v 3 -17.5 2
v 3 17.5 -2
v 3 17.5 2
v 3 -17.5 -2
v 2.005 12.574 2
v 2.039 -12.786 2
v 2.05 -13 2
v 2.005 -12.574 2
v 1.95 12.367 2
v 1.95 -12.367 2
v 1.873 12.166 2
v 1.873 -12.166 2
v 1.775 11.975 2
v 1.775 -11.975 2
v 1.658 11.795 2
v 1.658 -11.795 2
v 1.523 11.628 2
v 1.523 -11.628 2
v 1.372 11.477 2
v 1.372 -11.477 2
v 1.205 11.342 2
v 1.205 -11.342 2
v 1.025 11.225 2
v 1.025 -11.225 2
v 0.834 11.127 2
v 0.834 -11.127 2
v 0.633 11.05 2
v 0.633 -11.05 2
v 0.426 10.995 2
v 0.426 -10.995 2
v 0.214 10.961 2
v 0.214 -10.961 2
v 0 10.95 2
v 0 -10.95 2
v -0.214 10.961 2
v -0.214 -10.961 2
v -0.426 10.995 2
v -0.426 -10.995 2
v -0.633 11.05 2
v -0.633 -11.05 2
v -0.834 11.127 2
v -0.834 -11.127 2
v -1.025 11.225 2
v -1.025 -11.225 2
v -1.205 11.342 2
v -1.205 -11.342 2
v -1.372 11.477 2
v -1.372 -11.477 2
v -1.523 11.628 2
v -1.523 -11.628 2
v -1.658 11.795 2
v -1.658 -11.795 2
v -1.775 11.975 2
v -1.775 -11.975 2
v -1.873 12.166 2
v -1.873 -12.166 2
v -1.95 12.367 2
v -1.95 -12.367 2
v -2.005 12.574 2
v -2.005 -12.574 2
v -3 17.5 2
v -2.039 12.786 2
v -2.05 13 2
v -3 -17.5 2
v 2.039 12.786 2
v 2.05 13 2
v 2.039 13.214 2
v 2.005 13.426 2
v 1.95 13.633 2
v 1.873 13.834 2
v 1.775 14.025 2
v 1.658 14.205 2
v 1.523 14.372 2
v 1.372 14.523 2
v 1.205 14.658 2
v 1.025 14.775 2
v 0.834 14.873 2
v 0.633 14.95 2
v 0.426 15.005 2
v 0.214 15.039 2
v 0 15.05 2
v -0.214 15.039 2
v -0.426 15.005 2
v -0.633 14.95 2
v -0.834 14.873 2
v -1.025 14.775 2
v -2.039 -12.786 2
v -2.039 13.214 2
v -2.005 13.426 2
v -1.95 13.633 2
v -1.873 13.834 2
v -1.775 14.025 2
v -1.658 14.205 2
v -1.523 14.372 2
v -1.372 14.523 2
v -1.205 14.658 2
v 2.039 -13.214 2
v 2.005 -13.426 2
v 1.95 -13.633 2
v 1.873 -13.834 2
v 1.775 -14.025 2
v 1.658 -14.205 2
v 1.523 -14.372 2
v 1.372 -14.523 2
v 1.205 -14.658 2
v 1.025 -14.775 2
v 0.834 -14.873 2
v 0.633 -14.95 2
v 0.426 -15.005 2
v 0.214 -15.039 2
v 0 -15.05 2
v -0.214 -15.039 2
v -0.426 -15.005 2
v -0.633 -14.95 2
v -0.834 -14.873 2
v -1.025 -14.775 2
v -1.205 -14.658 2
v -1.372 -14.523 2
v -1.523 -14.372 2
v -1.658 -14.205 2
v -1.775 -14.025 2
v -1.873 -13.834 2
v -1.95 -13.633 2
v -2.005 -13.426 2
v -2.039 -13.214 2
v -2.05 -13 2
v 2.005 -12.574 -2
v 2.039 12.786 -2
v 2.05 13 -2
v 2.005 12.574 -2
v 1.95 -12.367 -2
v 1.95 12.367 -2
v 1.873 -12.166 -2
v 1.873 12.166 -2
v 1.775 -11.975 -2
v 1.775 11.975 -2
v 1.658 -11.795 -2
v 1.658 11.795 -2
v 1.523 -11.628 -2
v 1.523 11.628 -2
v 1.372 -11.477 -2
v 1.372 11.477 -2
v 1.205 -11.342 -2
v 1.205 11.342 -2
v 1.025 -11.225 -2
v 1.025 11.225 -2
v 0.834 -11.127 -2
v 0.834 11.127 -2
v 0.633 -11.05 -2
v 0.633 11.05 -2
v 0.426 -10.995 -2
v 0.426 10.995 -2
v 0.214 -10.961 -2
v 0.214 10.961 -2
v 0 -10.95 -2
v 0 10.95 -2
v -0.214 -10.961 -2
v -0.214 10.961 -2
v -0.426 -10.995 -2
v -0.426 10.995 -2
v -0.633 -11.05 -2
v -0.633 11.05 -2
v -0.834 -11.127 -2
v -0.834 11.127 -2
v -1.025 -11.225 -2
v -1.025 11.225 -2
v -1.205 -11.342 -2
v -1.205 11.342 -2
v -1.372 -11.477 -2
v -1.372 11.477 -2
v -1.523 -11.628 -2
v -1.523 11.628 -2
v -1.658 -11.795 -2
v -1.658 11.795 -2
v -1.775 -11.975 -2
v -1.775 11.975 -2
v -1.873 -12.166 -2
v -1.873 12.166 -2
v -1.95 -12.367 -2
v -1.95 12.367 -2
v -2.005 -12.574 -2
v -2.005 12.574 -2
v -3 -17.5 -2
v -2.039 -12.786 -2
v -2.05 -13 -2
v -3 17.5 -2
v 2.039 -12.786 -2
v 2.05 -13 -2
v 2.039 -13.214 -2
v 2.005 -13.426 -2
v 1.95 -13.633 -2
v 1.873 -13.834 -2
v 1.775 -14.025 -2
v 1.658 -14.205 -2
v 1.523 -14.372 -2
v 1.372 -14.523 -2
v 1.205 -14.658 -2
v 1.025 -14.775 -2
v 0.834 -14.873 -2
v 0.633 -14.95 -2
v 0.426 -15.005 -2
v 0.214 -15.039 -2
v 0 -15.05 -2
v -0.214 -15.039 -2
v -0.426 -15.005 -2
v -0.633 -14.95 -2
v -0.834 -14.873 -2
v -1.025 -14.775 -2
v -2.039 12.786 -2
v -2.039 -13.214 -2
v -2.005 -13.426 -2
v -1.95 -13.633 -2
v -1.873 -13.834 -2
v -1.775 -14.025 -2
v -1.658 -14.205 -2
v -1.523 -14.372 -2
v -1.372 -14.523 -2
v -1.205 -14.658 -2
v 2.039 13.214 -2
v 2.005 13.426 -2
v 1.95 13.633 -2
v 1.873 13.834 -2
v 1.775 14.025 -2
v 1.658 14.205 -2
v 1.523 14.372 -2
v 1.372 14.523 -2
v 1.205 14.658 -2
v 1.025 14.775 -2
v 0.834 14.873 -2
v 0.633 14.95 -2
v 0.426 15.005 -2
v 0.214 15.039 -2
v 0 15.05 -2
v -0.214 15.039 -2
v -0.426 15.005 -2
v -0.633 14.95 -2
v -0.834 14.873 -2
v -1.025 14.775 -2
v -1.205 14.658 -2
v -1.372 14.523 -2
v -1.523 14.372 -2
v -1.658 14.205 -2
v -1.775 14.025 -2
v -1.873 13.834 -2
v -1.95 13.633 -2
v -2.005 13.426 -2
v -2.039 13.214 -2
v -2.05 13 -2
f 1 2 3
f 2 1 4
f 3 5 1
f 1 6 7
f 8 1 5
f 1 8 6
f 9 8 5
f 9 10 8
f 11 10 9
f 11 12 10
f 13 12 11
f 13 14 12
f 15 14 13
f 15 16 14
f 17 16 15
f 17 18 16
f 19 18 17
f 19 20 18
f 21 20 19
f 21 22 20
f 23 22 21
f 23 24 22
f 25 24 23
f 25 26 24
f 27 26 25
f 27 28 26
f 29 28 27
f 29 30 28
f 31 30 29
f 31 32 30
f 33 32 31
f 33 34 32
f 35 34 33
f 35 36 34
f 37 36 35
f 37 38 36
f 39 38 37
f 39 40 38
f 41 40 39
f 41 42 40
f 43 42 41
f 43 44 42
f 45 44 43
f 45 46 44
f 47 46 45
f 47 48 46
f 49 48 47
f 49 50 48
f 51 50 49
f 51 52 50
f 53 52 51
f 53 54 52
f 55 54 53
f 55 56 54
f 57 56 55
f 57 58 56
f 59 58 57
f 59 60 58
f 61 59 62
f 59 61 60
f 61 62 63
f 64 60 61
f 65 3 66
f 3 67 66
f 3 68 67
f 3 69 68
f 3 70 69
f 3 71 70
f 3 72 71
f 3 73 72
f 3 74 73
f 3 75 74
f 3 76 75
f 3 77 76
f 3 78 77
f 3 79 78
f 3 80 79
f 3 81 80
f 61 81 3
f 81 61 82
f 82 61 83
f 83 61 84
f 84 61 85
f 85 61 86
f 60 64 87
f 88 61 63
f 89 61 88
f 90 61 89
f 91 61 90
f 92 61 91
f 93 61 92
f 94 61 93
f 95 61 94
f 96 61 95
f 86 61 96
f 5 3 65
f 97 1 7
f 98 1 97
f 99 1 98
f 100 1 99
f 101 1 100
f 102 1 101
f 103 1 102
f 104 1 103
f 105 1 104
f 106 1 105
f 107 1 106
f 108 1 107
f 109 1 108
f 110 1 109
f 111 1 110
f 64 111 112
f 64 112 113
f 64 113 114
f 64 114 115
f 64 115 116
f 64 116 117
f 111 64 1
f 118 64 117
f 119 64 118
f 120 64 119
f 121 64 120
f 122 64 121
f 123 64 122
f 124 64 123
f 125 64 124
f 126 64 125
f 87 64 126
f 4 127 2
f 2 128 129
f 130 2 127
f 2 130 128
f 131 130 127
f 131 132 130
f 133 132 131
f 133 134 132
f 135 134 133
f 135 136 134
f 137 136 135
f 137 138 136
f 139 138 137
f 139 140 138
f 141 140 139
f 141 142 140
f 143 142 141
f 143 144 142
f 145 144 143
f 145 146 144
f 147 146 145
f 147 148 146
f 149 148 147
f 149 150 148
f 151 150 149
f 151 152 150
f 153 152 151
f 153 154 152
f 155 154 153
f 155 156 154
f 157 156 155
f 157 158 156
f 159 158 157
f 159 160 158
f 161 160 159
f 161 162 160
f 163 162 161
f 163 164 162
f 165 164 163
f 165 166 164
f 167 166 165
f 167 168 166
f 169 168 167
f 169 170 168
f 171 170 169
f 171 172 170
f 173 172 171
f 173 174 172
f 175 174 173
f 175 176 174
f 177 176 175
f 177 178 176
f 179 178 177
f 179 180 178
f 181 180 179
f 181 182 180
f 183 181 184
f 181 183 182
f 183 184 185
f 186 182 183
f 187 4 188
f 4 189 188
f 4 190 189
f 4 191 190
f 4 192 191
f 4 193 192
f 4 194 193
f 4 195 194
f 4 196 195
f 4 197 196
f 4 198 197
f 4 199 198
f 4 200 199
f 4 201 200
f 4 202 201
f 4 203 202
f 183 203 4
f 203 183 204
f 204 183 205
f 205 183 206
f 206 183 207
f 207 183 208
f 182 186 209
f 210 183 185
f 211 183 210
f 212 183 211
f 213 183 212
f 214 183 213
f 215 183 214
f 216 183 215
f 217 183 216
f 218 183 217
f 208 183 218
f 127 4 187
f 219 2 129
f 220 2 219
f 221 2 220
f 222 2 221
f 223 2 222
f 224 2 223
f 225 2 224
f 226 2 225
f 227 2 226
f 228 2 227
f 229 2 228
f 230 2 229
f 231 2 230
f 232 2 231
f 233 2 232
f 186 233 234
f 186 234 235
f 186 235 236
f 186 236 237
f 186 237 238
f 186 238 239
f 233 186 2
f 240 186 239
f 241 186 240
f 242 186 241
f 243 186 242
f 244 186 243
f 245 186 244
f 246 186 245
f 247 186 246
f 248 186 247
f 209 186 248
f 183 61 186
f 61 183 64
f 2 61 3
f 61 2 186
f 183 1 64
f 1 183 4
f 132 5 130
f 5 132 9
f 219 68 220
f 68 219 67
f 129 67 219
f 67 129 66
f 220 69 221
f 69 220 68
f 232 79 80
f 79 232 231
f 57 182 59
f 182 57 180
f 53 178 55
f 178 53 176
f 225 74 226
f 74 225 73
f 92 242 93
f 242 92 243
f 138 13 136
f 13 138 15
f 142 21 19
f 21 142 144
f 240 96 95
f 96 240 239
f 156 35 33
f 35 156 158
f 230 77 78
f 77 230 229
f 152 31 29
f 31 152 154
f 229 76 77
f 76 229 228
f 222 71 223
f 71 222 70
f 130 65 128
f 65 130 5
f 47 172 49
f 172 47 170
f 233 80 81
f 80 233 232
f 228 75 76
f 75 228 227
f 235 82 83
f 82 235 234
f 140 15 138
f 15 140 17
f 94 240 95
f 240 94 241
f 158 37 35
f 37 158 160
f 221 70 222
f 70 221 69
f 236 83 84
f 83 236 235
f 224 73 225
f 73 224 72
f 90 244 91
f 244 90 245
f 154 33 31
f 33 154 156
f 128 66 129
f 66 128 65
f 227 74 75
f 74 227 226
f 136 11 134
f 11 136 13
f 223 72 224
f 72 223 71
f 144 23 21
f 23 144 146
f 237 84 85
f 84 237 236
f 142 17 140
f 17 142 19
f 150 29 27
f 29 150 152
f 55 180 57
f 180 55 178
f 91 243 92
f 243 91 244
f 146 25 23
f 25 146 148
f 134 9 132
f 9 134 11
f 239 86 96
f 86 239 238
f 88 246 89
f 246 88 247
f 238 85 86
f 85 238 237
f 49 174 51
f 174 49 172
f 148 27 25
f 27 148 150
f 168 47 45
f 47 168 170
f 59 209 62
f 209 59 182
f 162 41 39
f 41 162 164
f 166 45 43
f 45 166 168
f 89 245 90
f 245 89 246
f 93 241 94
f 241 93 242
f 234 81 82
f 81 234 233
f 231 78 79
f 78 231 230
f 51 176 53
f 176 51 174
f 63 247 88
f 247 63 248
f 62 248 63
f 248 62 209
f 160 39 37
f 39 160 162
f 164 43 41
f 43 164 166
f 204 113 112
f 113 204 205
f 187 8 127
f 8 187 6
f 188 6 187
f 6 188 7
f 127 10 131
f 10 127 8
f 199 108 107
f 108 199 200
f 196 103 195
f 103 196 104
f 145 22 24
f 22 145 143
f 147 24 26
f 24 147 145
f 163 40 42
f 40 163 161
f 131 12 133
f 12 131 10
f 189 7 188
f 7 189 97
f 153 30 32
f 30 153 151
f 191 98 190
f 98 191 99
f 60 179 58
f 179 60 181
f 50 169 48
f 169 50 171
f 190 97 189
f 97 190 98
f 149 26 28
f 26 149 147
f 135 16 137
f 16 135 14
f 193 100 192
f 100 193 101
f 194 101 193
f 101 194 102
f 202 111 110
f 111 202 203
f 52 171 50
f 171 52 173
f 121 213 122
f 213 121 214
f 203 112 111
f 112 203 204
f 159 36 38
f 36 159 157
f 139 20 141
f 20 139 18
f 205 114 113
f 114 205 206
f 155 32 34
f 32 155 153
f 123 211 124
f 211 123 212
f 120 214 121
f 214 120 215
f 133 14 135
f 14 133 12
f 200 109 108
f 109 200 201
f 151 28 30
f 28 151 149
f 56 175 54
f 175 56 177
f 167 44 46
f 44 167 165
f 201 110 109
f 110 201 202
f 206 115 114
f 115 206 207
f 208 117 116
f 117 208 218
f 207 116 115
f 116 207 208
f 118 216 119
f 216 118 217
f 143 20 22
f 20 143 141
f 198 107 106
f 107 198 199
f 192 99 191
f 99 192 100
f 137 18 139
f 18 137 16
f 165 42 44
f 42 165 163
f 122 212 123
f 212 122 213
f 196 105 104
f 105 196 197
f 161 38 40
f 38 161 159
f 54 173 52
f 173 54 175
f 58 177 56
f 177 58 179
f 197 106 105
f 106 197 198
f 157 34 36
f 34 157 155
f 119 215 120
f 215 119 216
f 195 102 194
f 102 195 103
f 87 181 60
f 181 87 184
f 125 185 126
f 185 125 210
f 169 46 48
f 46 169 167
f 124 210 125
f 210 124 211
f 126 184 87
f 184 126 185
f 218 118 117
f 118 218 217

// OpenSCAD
// file: constants.scad
    /*Project constants*/
//width = ScrewHoleDist+(BaseDiam*2)+ WidthCompl
//
//Distance of the holes for mounting, affects the width(y-axis)
ScrewHoleDist = 31;

//Thickness of the plate
BaseThick = 8.0;

 
//Diameter of the hole in the middle on the stepper holder
MidHoleDiam = 23;

//Diameter of the screw hole
ScrewHoleDiam = 3.1;
    
//Diameter of the corner cylinders,affects the width of the body(y-axis)
BaseDiam = 3;

//Body width complement (y-axis)
WidthCompl = 10;
//Body length complement (x-axis)
LengthCompl = 10;

//Body length complement for the upper part (x-axis)
LengthDiffUp = 5;

//Body length complement for the moving part (x)
LengthDiffDown = 5;

W = ScrewHoleDist+(BaseDiam*2)+WidthCompl;
L = ScrewHoleDist+(BaseDiam*2)+LengthCompl;



//Diameter of the smooth rods
RodDiam = 5;

SmoothRodDistFromCenter = 16.5; // 31/2;

//diameter of the bearing
BearingDiam = RodDiam+6;

BearingHeight = 20 + 2;

//Diameter of the threaded rod  
ThreadedRodDiam = 10.3;

//Diameter of the hole for the threaded rod
ThreadedRodHoleDiam = 10.8;

NutDiam = 22.0;
NutHeight =20;
NutWall=2;
NutHoleDiam = NutDiam-2*NutWall;


//size and height of the linear motion nut
ThreadedNutSize = 10.25;
ThreadedNutHeight = 4.95;

//size and height of the syringe tightening nut
SyrNutSize = 5.6; //5.41
SyrNutHeight = 2.4; //2.32

//Height of the syringe mounting body
BodyHeight = 190;

//Syringe mounting
SyrMountDownHeight = 110;

//Syringe radius for the mounting
SyrDiamDown =8;

SyrDiamUp = 4.6;

//Dimensions of the syringe fastening plate
PlateX=6;
PlateY=35;
PlateHolesYPos=13;

//Safety Button
ButtonX = 7;
ButtonY = 6.4;
ButtonThick = 3.4;
ButtonXPos = -15;

//Board screw holes
BoardScrewHolePosX = -23;
BoardScrewHolePosY = 11;
BoardScrewLength = 20;
BoardScrewHoleDiam= 2.5;


//Display board
DisplayX = 12;
DisplayY = 38.3;
// main file
include<constants.scad>

//tightPlate();
tight_plate(PlateX,PlateY,BaseThick/2,PlateHolesYPos,ScrewHoleDiam/2+0.5,0);

module tight_plate(x,y,z,holeY,holeD,syrD){
    difference(){
    cube([x,y,z],true);
    
    translate([0,holeY,0])cylinder(z*2,holeD,holeD,$fn=60,true);
    translate([0,-holeY,0])cylinder(z*2,holeD,holeD,$fn=60,true);
    translate([x/2,0,0])cylinder(z*2,syrD,syrD,$fn=60,true);
    }
}
